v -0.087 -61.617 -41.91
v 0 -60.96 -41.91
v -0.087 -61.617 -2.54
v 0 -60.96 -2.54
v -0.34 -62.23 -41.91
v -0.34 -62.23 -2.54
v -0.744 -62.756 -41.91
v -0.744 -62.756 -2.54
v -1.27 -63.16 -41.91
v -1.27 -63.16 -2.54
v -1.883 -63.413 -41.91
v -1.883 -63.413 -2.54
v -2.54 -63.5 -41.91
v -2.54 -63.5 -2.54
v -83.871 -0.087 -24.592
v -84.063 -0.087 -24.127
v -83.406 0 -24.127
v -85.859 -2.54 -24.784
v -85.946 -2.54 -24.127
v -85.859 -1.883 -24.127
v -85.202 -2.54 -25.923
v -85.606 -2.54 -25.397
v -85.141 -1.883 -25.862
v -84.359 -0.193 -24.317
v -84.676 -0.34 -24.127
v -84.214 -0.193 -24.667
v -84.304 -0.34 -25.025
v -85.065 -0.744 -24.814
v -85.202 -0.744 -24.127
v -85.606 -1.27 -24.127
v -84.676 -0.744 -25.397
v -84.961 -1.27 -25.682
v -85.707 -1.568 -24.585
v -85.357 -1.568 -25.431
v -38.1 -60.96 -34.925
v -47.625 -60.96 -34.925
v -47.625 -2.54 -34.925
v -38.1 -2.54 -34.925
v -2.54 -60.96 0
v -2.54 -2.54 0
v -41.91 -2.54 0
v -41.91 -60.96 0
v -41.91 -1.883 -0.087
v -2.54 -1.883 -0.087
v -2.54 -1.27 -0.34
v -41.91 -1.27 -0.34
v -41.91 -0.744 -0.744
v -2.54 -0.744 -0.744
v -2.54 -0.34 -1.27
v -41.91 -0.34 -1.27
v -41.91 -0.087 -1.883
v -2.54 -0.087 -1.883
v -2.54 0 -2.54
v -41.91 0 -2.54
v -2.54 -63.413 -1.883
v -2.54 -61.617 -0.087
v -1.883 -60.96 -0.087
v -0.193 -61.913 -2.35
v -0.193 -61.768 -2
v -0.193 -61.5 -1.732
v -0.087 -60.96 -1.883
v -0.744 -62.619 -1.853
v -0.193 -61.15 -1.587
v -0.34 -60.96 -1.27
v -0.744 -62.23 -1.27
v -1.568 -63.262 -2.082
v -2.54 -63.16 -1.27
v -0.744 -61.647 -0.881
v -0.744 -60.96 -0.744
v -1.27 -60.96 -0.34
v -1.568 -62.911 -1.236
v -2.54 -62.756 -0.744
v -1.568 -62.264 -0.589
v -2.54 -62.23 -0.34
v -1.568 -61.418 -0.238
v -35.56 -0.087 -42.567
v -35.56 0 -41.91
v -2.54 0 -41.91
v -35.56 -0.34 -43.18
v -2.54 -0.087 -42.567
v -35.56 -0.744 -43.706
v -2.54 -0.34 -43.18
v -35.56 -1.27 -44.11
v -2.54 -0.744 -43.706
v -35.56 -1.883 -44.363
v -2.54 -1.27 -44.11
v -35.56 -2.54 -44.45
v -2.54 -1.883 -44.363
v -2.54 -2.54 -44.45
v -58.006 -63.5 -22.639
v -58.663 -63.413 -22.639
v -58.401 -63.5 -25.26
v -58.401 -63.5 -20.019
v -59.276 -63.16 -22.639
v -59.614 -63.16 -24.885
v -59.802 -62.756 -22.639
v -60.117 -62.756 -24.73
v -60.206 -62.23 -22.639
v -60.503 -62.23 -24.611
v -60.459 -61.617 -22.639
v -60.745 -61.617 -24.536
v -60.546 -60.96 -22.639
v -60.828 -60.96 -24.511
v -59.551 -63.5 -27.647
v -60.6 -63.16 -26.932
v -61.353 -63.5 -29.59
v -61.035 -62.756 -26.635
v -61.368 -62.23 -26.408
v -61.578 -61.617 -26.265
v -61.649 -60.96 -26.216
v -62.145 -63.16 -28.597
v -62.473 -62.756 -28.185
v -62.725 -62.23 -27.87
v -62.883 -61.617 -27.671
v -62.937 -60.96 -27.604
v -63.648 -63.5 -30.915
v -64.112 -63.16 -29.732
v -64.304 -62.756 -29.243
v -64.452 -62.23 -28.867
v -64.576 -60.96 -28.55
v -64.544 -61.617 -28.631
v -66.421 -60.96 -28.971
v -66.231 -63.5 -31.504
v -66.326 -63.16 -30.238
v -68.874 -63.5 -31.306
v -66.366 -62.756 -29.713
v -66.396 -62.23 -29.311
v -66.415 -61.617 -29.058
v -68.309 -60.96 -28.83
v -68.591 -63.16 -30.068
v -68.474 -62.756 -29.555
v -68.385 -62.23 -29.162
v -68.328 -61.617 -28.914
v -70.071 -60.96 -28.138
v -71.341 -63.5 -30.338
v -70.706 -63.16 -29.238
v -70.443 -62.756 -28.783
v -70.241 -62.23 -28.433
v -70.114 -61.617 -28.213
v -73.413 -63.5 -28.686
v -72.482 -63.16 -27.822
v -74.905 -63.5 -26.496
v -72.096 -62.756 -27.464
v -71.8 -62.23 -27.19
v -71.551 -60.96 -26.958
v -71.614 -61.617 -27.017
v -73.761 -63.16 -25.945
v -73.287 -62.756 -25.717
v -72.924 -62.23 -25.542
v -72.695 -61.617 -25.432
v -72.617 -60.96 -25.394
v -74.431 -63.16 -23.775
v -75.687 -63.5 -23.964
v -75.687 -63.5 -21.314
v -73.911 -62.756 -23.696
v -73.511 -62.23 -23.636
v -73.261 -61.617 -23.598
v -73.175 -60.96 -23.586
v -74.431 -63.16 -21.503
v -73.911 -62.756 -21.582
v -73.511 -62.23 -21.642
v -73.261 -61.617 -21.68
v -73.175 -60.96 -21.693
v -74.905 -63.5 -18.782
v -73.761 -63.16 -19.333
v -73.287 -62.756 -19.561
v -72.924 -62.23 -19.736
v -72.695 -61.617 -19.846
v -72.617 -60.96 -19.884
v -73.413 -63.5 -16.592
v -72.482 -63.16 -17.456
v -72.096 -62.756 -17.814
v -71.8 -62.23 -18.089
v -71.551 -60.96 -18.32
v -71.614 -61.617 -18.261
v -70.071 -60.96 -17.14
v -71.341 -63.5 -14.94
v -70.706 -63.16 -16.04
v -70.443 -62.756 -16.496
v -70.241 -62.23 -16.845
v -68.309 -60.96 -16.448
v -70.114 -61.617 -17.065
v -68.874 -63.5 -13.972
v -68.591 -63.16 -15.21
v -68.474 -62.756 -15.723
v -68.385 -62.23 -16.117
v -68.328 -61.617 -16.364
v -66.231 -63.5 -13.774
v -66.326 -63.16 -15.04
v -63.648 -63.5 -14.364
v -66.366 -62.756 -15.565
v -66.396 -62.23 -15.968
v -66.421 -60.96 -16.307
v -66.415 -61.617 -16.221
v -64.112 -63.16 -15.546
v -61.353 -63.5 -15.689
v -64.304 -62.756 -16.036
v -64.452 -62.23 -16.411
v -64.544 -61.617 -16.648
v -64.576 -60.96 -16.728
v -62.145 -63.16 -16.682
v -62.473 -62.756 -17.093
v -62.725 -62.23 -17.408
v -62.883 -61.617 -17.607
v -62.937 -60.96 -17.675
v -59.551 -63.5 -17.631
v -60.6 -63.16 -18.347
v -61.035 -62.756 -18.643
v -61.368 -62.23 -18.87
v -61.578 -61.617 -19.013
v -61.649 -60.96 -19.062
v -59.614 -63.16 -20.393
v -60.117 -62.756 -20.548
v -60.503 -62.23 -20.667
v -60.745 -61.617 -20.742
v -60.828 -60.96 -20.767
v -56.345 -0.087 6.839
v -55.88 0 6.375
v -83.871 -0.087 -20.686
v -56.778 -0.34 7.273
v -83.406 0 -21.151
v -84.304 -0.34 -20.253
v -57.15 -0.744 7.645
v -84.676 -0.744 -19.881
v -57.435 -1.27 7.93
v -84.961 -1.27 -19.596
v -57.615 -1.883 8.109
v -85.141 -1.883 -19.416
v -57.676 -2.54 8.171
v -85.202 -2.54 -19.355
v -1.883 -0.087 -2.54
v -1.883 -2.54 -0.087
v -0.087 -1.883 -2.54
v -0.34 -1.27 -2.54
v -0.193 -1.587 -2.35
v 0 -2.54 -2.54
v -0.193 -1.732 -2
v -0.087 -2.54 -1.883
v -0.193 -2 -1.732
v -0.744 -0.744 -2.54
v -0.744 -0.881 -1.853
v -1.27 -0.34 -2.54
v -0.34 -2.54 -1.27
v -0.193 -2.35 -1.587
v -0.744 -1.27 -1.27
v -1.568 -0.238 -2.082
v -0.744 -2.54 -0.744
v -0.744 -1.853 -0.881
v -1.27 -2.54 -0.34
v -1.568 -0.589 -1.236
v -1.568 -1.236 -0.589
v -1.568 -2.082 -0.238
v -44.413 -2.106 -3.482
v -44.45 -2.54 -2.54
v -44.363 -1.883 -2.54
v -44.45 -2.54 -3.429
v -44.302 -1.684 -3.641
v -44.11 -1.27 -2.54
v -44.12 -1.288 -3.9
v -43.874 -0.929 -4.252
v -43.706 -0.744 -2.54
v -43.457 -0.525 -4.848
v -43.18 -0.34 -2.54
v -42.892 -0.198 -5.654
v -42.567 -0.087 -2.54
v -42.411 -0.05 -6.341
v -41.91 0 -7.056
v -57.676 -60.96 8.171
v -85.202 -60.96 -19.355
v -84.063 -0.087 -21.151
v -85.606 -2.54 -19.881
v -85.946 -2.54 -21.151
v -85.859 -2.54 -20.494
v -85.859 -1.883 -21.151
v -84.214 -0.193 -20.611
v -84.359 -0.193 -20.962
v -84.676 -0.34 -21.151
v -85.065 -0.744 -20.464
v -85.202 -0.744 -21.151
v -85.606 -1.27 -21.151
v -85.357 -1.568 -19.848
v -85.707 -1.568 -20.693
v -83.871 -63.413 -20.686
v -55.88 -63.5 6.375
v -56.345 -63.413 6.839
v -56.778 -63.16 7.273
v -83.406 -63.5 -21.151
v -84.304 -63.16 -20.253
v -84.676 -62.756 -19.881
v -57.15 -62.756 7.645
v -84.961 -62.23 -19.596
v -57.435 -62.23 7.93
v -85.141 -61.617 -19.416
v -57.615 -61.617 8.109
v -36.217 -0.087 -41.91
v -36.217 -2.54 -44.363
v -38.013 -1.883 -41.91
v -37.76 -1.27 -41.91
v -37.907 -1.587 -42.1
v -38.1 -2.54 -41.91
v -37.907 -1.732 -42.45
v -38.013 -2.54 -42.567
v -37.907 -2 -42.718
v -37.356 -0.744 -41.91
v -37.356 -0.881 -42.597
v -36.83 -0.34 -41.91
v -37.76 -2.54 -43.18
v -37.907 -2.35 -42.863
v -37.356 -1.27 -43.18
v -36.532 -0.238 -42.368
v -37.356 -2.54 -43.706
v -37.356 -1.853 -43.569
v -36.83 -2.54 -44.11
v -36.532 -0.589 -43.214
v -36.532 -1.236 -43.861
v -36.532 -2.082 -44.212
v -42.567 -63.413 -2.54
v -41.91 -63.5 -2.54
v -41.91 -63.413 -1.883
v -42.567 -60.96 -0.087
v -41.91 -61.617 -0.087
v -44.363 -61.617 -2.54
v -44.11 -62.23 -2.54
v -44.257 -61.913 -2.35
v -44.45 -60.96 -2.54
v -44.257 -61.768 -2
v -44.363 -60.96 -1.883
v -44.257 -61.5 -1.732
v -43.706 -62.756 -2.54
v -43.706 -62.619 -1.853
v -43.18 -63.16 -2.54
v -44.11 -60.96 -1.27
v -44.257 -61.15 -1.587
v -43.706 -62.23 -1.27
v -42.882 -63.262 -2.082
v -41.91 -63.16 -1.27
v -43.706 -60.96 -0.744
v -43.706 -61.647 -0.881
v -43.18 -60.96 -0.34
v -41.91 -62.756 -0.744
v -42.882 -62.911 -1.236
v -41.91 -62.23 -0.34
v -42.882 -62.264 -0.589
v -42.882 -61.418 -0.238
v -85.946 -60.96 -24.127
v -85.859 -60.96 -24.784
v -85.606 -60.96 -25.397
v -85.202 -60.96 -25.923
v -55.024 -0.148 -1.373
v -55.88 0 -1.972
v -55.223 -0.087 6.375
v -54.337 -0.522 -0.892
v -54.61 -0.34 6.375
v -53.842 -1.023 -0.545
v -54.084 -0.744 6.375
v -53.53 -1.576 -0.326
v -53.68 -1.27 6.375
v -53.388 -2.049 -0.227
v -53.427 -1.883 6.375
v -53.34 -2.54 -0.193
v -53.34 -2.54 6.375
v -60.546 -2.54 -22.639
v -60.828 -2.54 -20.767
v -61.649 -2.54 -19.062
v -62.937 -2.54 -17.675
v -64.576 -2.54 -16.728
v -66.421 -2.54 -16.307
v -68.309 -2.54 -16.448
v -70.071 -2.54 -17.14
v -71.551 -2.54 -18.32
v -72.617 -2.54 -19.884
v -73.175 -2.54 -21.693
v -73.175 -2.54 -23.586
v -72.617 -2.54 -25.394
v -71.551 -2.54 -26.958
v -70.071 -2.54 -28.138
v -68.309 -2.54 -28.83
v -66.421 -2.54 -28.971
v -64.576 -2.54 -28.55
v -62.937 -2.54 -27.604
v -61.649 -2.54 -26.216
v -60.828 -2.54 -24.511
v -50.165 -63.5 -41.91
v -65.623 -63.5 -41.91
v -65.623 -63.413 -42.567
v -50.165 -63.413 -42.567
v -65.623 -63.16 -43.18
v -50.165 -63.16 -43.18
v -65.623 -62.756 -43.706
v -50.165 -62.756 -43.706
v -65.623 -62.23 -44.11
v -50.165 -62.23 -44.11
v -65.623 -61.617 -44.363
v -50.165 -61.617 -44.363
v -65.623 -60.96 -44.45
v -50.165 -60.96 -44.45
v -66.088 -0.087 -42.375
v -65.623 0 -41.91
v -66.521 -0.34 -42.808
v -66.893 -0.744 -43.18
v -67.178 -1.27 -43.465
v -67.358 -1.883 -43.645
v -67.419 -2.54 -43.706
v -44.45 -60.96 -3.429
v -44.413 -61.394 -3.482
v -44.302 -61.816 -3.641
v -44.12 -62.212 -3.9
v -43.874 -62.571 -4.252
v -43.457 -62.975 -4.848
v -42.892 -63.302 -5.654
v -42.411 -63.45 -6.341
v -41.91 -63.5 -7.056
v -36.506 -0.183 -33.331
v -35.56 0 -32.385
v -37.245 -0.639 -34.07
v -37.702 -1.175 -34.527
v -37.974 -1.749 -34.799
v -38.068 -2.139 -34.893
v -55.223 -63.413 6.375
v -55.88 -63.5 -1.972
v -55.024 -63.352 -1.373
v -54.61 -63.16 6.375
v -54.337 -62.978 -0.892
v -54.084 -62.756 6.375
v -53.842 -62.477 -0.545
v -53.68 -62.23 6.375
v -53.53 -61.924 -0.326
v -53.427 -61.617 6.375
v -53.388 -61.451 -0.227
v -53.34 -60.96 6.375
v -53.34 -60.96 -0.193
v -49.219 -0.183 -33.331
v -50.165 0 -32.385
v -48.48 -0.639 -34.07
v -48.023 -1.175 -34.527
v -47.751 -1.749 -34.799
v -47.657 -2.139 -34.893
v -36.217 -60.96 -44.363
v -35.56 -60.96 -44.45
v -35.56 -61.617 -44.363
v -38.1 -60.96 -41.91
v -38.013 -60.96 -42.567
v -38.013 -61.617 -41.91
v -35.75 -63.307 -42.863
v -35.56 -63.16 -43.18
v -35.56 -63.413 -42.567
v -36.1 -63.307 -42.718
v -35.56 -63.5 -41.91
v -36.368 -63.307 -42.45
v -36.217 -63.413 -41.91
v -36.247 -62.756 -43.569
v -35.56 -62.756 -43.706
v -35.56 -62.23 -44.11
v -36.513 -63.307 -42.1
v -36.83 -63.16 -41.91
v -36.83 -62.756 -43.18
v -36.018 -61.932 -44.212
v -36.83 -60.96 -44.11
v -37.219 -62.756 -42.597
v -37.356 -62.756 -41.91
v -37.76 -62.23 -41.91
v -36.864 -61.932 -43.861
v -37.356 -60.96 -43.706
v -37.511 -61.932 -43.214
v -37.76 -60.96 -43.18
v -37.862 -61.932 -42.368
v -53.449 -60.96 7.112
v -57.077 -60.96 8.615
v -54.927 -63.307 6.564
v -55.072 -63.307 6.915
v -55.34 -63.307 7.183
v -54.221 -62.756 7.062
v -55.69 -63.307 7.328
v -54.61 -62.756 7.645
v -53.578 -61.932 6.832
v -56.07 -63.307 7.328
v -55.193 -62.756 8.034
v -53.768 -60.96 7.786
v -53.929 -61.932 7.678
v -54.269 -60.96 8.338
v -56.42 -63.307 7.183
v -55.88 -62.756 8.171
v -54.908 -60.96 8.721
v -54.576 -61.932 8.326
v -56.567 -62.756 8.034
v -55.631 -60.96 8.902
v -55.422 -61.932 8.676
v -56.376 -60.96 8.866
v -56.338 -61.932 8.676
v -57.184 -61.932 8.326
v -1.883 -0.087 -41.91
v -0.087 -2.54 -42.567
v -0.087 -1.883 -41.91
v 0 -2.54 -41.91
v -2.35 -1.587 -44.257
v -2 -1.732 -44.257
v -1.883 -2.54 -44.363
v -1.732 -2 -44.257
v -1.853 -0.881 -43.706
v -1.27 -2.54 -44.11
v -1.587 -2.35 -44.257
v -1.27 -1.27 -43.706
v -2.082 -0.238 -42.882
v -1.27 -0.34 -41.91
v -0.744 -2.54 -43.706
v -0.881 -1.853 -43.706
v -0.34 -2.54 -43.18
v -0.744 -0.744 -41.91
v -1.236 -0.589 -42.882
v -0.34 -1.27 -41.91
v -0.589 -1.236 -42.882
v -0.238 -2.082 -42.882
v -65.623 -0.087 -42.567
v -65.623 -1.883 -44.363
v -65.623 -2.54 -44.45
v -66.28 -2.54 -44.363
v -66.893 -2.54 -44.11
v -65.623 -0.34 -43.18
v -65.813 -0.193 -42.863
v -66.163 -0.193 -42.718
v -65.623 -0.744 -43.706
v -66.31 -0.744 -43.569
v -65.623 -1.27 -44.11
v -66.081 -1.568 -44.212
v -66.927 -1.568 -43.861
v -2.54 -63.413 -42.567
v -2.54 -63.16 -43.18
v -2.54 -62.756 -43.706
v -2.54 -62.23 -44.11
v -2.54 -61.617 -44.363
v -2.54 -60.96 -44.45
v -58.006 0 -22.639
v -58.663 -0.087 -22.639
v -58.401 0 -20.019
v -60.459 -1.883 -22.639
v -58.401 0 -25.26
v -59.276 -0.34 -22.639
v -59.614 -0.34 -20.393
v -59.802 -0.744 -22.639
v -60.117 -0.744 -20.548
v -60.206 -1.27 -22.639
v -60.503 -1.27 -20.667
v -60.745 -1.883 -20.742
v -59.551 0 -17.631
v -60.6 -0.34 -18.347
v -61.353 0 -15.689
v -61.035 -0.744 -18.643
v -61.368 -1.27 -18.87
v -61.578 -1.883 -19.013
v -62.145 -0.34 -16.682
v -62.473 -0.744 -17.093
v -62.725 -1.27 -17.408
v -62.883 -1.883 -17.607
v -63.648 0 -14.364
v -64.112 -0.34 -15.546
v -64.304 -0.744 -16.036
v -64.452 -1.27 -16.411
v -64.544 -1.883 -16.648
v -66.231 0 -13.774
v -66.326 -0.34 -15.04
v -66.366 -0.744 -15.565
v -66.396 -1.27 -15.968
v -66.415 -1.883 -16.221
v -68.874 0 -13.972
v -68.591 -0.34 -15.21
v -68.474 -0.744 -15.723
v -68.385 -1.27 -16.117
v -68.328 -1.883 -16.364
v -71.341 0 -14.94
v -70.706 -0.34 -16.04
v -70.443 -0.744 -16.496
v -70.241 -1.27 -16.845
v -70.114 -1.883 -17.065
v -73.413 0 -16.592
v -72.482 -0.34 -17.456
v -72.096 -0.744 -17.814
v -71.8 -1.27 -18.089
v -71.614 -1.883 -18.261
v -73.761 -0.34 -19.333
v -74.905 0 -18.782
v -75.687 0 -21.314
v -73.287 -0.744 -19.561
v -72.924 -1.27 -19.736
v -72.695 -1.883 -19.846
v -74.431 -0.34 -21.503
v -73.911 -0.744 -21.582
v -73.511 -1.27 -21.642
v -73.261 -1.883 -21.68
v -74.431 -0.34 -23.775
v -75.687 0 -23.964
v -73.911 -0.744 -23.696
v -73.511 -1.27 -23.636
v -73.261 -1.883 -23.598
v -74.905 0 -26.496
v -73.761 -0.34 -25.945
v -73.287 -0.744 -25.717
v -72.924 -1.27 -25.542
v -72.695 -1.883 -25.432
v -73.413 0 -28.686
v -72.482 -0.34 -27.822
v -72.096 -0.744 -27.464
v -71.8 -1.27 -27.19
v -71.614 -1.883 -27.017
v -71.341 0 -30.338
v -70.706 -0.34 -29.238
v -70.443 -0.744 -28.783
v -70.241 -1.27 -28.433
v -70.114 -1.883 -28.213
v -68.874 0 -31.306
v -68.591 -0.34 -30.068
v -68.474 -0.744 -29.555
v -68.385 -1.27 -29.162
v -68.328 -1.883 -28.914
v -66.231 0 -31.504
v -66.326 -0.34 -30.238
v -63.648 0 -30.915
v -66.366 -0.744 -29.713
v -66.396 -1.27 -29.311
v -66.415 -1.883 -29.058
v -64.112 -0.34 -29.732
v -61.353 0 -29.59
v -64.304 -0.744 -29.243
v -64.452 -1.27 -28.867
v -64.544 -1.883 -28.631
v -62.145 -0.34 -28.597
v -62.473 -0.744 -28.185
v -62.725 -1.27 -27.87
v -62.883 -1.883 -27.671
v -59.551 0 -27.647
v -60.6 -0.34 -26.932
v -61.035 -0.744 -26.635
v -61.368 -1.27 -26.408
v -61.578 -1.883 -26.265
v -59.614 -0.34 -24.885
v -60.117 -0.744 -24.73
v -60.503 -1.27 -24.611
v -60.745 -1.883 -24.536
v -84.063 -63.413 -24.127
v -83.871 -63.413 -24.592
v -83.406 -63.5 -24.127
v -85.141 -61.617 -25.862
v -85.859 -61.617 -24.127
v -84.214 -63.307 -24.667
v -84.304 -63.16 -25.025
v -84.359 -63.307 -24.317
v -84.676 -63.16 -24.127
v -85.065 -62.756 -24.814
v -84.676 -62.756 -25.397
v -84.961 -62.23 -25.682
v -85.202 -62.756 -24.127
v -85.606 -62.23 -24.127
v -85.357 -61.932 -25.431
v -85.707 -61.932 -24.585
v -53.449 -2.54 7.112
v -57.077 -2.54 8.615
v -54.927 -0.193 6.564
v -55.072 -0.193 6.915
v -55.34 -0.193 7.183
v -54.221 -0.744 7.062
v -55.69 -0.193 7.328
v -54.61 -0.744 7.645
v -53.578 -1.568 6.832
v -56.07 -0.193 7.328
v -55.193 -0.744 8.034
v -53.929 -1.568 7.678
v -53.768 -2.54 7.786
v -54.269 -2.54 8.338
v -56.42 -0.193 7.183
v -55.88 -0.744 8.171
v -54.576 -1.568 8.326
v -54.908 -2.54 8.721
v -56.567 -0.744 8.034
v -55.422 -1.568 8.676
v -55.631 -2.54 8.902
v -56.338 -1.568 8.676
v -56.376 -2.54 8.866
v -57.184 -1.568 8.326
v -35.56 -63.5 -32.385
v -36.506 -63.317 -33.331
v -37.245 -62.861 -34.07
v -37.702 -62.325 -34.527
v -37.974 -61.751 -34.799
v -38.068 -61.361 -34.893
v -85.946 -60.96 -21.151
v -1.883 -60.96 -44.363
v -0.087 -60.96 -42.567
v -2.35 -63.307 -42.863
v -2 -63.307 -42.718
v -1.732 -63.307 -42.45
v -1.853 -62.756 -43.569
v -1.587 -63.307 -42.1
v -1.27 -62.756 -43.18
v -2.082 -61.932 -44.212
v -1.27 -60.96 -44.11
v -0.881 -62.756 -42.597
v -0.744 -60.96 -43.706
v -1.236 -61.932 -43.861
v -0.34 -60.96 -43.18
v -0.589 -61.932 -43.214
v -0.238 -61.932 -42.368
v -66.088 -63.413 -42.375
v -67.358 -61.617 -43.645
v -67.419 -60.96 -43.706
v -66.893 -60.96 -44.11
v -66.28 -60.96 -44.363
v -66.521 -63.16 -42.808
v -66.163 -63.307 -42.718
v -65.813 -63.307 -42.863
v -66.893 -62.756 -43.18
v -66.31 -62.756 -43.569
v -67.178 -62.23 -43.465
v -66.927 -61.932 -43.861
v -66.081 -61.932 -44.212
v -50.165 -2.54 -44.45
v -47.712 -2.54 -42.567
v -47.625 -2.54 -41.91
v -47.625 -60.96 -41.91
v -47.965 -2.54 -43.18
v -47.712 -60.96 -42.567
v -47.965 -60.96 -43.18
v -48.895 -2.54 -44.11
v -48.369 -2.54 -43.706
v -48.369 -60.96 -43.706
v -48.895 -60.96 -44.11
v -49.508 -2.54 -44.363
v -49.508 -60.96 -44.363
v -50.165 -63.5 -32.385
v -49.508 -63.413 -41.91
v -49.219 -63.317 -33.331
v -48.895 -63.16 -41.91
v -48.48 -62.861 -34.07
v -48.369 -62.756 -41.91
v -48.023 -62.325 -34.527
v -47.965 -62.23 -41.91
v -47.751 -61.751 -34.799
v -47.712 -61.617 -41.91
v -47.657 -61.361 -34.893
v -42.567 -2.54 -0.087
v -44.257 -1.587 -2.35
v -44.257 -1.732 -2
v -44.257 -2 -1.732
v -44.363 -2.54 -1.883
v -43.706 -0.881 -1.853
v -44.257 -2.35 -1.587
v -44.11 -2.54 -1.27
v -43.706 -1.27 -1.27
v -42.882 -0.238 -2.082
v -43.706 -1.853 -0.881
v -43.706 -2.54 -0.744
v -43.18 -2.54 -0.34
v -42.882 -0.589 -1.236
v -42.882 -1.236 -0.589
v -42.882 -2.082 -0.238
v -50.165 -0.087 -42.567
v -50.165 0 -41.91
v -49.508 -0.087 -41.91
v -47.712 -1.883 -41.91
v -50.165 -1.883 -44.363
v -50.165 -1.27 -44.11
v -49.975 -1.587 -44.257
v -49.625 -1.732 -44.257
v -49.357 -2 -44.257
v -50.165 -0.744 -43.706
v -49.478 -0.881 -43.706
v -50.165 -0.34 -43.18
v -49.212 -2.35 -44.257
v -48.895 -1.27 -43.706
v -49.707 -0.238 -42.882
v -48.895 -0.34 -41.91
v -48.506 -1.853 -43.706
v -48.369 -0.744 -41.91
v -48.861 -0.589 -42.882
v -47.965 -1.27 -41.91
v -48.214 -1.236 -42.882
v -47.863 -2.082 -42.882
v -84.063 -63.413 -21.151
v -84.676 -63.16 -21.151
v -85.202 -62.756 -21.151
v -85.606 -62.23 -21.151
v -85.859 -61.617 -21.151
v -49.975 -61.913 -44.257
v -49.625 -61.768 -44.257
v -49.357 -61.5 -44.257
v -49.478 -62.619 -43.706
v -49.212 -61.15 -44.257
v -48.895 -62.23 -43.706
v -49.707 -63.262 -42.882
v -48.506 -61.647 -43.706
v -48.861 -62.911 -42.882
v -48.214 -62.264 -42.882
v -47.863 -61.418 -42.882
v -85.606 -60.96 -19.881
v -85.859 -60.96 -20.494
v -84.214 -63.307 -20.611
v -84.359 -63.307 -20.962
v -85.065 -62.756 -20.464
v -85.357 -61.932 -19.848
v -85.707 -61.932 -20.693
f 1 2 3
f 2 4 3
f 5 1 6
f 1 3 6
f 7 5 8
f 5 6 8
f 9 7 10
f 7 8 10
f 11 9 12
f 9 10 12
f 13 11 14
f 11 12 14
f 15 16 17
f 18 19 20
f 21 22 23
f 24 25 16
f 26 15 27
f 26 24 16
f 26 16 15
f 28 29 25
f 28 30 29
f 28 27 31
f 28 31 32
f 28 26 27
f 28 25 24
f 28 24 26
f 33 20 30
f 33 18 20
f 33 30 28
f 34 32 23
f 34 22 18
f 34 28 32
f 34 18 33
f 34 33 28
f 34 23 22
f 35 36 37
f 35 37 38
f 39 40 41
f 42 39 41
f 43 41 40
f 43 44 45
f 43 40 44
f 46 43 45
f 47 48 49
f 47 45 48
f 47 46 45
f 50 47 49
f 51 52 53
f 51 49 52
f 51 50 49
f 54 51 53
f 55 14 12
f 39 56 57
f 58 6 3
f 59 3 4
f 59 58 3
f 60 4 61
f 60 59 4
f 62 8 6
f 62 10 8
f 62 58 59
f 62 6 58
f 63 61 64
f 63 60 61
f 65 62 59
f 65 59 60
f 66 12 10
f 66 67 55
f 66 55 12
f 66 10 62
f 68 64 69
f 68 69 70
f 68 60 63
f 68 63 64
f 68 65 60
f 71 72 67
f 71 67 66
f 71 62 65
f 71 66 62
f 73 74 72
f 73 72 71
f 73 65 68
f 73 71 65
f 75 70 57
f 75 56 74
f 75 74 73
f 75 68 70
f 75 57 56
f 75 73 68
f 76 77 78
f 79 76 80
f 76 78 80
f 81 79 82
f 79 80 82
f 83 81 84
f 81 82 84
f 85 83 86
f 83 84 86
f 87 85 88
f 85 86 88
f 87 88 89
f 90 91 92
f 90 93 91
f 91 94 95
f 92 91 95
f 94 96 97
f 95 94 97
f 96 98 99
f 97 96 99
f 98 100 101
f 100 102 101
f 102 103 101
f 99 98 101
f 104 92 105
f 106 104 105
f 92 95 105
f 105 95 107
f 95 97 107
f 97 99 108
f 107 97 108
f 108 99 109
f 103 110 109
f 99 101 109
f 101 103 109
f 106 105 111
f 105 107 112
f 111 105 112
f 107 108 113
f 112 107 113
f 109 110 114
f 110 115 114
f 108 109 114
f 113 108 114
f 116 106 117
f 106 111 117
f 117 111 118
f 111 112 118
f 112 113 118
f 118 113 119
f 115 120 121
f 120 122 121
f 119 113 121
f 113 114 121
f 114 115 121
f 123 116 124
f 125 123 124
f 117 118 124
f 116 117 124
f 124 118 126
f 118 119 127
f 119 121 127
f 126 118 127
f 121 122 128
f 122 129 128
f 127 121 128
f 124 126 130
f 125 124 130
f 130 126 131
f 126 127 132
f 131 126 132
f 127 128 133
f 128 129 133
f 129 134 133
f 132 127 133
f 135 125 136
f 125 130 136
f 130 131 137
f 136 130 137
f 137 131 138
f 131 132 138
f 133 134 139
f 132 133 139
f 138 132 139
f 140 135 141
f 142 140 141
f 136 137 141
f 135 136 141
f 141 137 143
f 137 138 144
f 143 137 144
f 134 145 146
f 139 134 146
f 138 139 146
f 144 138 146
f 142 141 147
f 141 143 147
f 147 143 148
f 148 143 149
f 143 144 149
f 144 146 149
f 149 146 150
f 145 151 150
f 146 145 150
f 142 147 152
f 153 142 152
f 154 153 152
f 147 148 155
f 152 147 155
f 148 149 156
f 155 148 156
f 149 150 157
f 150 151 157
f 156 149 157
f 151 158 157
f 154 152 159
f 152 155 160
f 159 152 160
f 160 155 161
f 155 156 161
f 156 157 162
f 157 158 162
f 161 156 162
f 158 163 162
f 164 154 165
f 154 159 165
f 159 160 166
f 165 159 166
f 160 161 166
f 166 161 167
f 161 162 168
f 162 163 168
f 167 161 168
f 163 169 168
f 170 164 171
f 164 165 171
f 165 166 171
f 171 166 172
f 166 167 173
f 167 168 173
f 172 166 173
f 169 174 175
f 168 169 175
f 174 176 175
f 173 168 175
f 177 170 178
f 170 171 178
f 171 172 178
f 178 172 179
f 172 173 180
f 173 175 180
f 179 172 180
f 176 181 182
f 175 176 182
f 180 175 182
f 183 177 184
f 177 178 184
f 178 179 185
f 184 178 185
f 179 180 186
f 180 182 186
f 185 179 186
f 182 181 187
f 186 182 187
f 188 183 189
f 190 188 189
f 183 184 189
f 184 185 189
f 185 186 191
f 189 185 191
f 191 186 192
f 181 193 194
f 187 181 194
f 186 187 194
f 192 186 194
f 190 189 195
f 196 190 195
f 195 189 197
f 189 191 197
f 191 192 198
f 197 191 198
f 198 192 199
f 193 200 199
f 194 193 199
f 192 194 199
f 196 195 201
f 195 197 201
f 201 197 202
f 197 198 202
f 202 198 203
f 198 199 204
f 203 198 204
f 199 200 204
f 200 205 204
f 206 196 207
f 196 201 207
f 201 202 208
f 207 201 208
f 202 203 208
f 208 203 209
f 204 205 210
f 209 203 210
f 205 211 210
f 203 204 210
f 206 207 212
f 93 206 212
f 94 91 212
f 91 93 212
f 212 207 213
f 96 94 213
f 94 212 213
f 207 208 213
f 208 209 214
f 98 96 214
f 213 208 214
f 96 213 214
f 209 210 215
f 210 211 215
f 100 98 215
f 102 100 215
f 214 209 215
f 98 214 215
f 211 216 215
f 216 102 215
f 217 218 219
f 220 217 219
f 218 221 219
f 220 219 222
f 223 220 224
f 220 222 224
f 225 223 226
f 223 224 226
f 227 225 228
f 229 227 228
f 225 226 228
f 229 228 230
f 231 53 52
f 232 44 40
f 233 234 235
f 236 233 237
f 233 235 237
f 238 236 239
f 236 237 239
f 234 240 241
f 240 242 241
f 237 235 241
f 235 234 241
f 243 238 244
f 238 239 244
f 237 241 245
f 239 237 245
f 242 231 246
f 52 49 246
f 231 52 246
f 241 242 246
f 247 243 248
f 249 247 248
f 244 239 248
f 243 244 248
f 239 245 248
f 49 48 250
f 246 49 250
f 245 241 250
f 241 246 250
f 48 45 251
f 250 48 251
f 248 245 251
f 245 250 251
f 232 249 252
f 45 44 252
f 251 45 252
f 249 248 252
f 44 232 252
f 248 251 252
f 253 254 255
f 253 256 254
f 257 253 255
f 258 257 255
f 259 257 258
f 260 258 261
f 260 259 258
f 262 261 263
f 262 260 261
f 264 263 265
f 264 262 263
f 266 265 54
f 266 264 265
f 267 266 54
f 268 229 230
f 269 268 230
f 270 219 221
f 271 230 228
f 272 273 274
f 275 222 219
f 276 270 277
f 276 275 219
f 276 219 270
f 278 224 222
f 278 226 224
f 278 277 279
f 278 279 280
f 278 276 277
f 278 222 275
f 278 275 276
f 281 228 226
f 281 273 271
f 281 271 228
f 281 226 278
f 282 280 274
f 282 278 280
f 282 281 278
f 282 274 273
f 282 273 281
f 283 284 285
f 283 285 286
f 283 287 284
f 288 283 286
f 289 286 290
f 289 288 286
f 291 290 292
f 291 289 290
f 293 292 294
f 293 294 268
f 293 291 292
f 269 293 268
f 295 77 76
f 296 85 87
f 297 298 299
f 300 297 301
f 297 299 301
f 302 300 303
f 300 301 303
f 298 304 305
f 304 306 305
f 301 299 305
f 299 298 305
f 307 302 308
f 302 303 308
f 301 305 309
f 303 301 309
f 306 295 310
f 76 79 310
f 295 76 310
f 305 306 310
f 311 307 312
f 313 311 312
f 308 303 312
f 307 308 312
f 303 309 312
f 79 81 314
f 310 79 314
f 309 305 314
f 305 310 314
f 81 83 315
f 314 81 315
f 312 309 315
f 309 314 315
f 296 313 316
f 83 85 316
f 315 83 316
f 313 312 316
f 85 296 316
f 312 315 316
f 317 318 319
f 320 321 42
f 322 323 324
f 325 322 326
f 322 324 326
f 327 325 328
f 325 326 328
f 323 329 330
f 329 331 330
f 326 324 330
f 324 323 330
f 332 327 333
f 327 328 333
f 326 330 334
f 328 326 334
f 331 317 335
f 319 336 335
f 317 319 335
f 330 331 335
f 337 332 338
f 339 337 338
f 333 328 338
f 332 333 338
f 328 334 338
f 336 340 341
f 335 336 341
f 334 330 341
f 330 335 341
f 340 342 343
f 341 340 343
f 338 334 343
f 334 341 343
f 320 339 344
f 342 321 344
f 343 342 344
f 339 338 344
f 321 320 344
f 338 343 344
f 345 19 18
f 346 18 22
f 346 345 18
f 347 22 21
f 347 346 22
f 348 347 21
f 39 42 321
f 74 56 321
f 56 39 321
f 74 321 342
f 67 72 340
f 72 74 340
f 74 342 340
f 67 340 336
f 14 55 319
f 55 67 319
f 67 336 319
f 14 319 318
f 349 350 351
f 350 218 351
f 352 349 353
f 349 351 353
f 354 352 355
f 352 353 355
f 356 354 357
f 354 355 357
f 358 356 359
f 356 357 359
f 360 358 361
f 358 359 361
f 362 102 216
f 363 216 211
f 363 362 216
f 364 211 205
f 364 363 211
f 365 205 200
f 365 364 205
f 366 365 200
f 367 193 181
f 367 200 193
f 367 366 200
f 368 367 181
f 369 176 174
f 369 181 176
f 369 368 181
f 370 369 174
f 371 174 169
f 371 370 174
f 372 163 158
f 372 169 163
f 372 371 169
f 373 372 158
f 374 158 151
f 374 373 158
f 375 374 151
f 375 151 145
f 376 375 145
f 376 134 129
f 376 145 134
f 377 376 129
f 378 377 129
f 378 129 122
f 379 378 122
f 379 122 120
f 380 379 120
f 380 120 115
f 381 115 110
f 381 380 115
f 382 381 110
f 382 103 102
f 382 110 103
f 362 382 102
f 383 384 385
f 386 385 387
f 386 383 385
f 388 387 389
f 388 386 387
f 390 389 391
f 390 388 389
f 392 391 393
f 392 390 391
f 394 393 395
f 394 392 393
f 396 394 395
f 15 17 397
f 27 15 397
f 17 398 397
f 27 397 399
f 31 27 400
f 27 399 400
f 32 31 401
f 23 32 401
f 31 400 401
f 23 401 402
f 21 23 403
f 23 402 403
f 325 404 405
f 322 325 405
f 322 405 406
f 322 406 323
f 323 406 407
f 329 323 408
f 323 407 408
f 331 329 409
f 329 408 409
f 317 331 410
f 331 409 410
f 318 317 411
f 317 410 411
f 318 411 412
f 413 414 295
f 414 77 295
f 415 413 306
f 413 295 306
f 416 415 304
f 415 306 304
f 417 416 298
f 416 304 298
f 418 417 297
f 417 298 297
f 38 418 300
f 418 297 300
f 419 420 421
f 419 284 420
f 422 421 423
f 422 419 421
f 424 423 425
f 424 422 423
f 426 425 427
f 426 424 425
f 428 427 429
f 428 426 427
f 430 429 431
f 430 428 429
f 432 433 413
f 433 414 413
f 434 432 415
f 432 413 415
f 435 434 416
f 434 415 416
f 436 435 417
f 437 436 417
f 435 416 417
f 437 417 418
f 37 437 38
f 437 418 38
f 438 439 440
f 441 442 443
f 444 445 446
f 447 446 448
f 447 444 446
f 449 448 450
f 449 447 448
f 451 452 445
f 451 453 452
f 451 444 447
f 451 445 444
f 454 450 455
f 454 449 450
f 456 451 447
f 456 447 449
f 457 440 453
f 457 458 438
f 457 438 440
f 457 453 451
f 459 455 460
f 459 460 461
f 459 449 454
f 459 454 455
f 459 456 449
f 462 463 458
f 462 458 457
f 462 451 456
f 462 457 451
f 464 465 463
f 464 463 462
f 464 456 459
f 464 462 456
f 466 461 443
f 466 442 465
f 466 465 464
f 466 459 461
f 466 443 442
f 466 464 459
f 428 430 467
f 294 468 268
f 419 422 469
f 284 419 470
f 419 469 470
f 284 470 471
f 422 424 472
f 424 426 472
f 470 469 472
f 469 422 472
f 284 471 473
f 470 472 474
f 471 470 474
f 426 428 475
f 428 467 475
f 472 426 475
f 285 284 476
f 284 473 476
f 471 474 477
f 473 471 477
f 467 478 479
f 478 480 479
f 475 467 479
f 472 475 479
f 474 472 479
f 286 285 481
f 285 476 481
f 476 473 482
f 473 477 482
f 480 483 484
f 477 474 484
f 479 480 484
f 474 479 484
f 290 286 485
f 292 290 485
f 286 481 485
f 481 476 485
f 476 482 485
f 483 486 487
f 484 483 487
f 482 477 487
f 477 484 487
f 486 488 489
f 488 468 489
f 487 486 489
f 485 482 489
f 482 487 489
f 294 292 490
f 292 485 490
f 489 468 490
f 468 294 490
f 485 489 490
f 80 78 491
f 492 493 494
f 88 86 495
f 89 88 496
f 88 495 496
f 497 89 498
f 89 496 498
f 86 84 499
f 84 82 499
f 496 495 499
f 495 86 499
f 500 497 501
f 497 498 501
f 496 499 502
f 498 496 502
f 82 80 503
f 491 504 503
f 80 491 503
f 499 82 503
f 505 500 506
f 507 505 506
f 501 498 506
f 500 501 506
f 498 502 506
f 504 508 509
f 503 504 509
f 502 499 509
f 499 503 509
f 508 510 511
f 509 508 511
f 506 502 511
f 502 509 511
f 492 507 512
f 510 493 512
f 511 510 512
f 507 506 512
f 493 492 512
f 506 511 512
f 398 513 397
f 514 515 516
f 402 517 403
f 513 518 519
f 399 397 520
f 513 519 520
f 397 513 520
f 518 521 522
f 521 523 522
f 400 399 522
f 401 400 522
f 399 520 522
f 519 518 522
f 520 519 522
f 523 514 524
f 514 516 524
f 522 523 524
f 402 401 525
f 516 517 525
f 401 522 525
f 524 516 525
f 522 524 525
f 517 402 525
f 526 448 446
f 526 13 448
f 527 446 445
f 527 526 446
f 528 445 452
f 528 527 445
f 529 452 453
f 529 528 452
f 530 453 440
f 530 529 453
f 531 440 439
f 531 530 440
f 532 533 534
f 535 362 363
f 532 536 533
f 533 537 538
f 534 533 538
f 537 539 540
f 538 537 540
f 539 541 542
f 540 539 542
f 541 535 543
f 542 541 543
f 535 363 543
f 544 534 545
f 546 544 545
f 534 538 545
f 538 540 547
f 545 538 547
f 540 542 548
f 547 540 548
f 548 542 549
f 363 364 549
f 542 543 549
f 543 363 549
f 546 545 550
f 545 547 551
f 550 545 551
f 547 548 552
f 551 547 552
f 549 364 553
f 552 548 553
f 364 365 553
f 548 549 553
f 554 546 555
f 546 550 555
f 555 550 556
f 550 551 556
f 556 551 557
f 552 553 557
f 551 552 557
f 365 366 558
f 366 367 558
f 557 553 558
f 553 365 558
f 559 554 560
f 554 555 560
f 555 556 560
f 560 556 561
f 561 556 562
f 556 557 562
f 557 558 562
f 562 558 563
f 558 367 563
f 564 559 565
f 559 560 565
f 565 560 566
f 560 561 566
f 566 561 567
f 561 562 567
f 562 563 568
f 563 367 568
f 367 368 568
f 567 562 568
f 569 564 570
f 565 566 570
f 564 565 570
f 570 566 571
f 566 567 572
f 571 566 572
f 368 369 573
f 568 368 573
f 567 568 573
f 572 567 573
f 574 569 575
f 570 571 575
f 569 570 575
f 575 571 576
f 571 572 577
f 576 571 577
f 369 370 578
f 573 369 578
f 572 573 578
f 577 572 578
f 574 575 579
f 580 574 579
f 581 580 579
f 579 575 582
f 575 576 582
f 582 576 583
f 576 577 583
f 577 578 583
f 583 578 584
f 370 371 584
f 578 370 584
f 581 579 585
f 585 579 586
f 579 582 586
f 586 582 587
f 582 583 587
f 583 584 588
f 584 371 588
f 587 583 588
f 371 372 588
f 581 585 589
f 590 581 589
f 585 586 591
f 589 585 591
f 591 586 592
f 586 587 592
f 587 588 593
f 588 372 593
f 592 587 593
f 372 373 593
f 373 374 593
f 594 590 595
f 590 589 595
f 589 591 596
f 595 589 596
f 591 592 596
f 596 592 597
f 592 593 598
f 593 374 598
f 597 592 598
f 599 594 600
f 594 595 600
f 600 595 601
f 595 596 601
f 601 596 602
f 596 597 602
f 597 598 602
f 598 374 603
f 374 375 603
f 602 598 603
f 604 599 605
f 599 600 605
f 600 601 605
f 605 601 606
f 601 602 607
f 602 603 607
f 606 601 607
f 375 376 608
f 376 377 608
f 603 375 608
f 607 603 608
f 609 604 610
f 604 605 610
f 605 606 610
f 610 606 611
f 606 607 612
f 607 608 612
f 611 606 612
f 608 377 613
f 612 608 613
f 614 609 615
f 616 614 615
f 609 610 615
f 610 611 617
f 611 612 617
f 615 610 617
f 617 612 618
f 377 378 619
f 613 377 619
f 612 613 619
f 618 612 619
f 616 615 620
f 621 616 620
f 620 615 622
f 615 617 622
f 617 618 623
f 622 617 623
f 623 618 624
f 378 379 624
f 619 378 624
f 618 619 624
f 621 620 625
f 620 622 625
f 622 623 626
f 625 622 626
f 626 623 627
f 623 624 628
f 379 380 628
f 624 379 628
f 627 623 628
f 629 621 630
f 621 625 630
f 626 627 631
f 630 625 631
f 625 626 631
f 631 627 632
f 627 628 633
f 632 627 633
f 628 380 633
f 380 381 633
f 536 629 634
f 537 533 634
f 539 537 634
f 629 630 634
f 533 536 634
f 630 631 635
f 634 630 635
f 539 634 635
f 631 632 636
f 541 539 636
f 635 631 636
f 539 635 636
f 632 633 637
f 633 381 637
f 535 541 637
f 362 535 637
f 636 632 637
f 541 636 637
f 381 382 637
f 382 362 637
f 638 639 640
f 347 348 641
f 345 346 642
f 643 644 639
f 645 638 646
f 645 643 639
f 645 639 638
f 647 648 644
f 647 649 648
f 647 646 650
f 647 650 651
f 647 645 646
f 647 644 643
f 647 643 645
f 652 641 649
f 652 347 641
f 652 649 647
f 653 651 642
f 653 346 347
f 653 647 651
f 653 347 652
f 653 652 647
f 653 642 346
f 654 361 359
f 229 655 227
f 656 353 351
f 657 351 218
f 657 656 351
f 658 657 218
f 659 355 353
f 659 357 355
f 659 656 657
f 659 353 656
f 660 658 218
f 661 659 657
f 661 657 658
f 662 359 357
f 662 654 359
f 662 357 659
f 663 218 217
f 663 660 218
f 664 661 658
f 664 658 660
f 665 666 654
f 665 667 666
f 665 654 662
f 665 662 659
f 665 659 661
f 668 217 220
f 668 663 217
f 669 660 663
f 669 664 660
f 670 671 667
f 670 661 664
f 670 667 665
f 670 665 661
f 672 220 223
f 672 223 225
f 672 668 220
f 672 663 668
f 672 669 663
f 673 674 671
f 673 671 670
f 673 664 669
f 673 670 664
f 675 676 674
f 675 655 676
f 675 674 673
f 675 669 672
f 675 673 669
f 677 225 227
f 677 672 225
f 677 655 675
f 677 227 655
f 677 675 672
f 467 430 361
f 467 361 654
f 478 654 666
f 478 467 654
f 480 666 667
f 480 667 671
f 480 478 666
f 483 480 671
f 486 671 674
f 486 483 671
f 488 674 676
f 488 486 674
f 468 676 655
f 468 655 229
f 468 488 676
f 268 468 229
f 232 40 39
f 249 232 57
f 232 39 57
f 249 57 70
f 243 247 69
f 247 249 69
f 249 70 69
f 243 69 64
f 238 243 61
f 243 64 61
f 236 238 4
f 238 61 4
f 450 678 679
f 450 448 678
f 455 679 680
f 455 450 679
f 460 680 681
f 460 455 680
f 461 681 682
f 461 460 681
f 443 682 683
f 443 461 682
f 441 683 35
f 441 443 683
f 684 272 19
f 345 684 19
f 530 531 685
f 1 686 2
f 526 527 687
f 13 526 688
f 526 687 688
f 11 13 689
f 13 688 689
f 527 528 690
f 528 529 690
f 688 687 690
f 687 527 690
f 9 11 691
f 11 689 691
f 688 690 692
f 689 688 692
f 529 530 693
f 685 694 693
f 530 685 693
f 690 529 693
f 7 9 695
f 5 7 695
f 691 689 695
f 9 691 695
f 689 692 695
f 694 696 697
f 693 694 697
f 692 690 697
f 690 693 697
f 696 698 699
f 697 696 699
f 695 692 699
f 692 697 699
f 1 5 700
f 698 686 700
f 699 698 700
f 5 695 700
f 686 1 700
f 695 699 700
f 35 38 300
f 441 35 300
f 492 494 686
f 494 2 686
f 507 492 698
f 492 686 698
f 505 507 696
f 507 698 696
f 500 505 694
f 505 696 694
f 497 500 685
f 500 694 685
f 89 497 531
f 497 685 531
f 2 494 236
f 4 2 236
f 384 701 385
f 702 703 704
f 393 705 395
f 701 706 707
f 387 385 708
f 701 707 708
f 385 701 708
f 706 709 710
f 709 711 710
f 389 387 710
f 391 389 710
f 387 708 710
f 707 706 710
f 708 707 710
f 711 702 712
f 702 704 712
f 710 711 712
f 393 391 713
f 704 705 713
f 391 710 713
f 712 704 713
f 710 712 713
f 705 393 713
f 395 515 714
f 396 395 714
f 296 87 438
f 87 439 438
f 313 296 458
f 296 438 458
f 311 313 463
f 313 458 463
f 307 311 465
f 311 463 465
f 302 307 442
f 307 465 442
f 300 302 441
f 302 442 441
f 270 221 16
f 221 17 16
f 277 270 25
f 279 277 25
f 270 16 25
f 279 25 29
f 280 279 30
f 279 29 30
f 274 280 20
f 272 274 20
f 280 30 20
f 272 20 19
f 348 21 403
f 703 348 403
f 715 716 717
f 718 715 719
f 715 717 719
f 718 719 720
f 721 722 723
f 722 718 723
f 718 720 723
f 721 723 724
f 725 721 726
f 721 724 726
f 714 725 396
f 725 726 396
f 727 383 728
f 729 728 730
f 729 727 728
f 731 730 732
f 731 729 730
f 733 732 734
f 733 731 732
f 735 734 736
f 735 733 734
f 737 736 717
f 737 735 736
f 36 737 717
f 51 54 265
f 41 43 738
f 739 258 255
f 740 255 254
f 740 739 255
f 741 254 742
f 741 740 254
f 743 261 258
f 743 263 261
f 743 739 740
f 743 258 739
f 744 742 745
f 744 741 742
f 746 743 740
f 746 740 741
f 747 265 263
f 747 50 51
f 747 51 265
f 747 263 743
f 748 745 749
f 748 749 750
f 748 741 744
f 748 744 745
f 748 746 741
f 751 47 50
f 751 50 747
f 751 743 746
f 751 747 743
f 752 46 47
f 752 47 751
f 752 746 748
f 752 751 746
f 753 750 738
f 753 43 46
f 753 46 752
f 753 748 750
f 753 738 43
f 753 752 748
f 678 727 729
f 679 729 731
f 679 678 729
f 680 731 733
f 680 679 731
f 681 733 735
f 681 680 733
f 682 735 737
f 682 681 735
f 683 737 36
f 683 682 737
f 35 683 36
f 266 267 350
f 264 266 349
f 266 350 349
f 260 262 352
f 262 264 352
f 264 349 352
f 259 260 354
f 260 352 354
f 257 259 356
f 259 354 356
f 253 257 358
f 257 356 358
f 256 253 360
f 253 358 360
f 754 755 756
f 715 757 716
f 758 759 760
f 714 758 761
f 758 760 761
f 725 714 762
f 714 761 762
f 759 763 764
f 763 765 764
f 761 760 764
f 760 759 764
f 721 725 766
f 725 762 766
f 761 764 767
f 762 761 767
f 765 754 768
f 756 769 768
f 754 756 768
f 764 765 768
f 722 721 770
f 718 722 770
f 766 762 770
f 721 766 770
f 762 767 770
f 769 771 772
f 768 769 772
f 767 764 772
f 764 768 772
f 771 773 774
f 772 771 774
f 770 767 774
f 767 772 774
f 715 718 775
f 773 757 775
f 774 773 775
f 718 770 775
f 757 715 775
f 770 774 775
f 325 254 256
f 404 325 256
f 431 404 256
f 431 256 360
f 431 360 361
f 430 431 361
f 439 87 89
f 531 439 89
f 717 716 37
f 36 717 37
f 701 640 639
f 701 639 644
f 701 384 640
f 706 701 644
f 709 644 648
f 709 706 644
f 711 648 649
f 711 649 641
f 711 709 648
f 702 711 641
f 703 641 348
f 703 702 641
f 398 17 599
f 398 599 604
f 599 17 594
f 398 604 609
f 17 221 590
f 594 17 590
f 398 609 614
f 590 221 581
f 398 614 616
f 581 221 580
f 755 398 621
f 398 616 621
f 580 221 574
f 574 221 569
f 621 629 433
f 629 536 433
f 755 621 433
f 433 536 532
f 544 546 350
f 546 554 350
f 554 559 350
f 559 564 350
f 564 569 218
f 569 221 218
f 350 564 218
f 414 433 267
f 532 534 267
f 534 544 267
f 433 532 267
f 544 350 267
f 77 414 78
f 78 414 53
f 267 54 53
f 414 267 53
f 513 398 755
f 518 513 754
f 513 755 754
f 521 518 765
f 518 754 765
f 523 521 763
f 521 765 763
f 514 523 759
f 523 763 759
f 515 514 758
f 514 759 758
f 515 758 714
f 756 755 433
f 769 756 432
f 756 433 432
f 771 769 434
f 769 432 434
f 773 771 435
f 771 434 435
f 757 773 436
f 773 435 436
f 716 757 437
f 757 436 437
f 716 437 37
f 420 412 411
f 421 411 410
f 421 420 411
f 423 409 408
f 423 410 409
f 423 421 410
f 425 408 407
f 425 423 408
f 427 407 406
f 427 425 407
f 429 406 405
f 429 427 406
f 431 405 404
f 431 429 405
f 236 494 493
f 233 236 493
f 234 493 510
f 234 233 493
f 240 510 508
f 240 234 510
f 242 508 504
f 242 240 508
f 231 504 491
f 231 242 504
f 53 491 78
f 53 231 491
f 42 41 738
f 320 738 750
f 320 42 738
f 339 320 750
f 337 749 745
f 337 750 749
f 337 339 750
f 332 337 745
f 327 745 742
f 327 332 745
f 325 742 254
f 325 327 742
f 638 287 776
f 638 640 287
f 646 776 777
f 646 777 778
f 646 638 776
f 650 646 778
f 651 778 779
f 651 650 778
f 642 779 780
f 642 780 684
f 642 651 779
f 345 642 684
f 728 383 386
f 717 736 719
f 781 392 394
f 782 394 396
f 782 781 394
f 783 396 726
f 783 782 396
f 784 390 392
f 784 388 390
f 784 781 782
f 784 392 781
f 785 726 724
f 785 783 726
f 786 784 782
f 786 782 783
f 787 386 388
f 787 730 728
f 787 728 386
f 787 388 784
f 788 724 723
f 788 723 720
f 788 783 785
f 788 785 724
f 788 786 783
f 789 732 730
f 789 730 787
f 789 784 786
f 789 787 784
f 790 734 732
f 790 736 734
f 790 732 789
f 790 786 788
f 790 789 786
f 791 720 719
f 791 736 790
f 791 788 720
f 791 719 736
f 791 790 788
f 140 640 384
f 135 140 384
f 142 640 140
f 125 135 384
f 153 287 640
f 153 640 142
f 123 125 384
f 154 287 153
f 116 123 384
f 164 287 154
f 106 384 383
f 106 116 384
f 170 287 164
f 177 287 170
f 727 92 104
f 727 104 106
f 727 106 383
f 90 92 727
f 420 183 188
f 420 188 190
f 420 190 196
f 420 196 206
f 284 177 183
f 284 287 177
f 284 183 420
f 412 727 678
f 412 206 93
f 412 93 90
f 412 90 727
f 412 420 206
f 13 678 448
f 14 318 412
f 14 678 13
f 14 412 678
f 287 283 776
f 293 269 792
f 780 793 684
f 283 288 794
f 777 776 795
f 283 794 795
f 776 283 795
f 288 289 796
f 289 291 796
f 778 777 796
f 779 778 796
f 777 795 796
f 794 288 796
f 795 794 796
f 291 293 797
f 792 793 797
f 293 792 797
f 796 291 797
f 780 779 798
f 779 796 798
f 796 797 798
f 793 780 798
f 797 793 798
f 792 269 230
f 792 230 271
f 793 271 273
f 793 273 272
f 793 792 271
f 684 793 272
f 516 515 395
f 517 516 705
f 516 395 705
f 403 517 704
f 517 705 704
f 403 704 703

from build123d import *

# Parameters (mm, degrees)
F1_DEPTH = 63.5
F2_R     = 6.35
F3_DEPTH = 63.501
F4_R     = 2.54


with BuildPart() as f1:
    # F0 (on Front) → F1 (new body)
    with BuildSketch(Plane.XZ):
        Polygon((0, 0), (-44.45, 0), (-44.45, -3.429), (-53.34, -0.193305), (-53.34, 12.506695), (-85.945848, -20.099152), (-85.945848, -25.179152), (-66.675, -44.45), (-47.625, -44.45), (-47.625, -34.925), (-38.1, -34.925), (-38.1, -44.45), (0, -44.45), align=None)
    extrude(amount=F1_DEPTH)

    # F2 (on Front) → F3 (cut, through all)
    with BuildSketch(Plane.XZ):
        with Locations((-66.895848, -22.639152)):
            Circle(F2_R)
    extrude(amount=F3_DEPTH, mode=Mode.SUBTRACT)

    # F4
    f4_edges = [f1.edges().sort_by_distance(p)[0] for p in [
        (-22.225, 0, 0),
        (0, 0, -22.225),
        (-44.45, 0, -1.7145),
        (-19.05, 0, -44.45),
        (-48.895, 0, -1.811152),
        (-38.1, 0, -39.6875),
        (-53.34, 0, 6.156695),
        (-42.8625, 0, -34.925),
        (-69.642924, 0, -3.796228),
        (-47.625, 0, -39.6875),
        (-85.945848, 0, -22.639152),
        (-57.15, 0, -44.45),
        (-76.310424, 0, -34.814576),
        (-73.245848, 0, -22.639152),
        (-85.945848, -31.75, -25.179152),
        (-66.675, -31.75, -44.45),
        (-76.310424, -63.5, -34.814576),
        (-38.1, -31.75, -44.45),
        (0, -31.75, -44.45),
        (-19.05, -63.5, -44.45),
        (-22.225, -63.5, 0),
        (0, -63.5, -22.225),
        (-44.45, -63.5, -1.7145),
        (-48.895, -63.5, -1.811152),
        (-38.1, -63.5, -39.6875),
        (-53.34, -63.5, 6.156695),
        (-42.8625, -63.5, -34.925),
        (-69.642924, -63.5, -3.796228),
        (-47.625, -63.5, -39.6875),
        (-85.945848, -63.5, -22.639152),
        (-57.15, -63.5, -44.45),
        (-73.245848, -63.5, -22.639152),
        (-47.625, -31.75, -44.45),
        (0, -31.75, 0),
        (-44.45, -31.75, 0),
        (-53.34, -31.75, 12.506695),
        (-85.945848, -31.75, -20.099152),
    ]]
    fillet(f4_edges, radius=F4_R)


solid = f1.part
